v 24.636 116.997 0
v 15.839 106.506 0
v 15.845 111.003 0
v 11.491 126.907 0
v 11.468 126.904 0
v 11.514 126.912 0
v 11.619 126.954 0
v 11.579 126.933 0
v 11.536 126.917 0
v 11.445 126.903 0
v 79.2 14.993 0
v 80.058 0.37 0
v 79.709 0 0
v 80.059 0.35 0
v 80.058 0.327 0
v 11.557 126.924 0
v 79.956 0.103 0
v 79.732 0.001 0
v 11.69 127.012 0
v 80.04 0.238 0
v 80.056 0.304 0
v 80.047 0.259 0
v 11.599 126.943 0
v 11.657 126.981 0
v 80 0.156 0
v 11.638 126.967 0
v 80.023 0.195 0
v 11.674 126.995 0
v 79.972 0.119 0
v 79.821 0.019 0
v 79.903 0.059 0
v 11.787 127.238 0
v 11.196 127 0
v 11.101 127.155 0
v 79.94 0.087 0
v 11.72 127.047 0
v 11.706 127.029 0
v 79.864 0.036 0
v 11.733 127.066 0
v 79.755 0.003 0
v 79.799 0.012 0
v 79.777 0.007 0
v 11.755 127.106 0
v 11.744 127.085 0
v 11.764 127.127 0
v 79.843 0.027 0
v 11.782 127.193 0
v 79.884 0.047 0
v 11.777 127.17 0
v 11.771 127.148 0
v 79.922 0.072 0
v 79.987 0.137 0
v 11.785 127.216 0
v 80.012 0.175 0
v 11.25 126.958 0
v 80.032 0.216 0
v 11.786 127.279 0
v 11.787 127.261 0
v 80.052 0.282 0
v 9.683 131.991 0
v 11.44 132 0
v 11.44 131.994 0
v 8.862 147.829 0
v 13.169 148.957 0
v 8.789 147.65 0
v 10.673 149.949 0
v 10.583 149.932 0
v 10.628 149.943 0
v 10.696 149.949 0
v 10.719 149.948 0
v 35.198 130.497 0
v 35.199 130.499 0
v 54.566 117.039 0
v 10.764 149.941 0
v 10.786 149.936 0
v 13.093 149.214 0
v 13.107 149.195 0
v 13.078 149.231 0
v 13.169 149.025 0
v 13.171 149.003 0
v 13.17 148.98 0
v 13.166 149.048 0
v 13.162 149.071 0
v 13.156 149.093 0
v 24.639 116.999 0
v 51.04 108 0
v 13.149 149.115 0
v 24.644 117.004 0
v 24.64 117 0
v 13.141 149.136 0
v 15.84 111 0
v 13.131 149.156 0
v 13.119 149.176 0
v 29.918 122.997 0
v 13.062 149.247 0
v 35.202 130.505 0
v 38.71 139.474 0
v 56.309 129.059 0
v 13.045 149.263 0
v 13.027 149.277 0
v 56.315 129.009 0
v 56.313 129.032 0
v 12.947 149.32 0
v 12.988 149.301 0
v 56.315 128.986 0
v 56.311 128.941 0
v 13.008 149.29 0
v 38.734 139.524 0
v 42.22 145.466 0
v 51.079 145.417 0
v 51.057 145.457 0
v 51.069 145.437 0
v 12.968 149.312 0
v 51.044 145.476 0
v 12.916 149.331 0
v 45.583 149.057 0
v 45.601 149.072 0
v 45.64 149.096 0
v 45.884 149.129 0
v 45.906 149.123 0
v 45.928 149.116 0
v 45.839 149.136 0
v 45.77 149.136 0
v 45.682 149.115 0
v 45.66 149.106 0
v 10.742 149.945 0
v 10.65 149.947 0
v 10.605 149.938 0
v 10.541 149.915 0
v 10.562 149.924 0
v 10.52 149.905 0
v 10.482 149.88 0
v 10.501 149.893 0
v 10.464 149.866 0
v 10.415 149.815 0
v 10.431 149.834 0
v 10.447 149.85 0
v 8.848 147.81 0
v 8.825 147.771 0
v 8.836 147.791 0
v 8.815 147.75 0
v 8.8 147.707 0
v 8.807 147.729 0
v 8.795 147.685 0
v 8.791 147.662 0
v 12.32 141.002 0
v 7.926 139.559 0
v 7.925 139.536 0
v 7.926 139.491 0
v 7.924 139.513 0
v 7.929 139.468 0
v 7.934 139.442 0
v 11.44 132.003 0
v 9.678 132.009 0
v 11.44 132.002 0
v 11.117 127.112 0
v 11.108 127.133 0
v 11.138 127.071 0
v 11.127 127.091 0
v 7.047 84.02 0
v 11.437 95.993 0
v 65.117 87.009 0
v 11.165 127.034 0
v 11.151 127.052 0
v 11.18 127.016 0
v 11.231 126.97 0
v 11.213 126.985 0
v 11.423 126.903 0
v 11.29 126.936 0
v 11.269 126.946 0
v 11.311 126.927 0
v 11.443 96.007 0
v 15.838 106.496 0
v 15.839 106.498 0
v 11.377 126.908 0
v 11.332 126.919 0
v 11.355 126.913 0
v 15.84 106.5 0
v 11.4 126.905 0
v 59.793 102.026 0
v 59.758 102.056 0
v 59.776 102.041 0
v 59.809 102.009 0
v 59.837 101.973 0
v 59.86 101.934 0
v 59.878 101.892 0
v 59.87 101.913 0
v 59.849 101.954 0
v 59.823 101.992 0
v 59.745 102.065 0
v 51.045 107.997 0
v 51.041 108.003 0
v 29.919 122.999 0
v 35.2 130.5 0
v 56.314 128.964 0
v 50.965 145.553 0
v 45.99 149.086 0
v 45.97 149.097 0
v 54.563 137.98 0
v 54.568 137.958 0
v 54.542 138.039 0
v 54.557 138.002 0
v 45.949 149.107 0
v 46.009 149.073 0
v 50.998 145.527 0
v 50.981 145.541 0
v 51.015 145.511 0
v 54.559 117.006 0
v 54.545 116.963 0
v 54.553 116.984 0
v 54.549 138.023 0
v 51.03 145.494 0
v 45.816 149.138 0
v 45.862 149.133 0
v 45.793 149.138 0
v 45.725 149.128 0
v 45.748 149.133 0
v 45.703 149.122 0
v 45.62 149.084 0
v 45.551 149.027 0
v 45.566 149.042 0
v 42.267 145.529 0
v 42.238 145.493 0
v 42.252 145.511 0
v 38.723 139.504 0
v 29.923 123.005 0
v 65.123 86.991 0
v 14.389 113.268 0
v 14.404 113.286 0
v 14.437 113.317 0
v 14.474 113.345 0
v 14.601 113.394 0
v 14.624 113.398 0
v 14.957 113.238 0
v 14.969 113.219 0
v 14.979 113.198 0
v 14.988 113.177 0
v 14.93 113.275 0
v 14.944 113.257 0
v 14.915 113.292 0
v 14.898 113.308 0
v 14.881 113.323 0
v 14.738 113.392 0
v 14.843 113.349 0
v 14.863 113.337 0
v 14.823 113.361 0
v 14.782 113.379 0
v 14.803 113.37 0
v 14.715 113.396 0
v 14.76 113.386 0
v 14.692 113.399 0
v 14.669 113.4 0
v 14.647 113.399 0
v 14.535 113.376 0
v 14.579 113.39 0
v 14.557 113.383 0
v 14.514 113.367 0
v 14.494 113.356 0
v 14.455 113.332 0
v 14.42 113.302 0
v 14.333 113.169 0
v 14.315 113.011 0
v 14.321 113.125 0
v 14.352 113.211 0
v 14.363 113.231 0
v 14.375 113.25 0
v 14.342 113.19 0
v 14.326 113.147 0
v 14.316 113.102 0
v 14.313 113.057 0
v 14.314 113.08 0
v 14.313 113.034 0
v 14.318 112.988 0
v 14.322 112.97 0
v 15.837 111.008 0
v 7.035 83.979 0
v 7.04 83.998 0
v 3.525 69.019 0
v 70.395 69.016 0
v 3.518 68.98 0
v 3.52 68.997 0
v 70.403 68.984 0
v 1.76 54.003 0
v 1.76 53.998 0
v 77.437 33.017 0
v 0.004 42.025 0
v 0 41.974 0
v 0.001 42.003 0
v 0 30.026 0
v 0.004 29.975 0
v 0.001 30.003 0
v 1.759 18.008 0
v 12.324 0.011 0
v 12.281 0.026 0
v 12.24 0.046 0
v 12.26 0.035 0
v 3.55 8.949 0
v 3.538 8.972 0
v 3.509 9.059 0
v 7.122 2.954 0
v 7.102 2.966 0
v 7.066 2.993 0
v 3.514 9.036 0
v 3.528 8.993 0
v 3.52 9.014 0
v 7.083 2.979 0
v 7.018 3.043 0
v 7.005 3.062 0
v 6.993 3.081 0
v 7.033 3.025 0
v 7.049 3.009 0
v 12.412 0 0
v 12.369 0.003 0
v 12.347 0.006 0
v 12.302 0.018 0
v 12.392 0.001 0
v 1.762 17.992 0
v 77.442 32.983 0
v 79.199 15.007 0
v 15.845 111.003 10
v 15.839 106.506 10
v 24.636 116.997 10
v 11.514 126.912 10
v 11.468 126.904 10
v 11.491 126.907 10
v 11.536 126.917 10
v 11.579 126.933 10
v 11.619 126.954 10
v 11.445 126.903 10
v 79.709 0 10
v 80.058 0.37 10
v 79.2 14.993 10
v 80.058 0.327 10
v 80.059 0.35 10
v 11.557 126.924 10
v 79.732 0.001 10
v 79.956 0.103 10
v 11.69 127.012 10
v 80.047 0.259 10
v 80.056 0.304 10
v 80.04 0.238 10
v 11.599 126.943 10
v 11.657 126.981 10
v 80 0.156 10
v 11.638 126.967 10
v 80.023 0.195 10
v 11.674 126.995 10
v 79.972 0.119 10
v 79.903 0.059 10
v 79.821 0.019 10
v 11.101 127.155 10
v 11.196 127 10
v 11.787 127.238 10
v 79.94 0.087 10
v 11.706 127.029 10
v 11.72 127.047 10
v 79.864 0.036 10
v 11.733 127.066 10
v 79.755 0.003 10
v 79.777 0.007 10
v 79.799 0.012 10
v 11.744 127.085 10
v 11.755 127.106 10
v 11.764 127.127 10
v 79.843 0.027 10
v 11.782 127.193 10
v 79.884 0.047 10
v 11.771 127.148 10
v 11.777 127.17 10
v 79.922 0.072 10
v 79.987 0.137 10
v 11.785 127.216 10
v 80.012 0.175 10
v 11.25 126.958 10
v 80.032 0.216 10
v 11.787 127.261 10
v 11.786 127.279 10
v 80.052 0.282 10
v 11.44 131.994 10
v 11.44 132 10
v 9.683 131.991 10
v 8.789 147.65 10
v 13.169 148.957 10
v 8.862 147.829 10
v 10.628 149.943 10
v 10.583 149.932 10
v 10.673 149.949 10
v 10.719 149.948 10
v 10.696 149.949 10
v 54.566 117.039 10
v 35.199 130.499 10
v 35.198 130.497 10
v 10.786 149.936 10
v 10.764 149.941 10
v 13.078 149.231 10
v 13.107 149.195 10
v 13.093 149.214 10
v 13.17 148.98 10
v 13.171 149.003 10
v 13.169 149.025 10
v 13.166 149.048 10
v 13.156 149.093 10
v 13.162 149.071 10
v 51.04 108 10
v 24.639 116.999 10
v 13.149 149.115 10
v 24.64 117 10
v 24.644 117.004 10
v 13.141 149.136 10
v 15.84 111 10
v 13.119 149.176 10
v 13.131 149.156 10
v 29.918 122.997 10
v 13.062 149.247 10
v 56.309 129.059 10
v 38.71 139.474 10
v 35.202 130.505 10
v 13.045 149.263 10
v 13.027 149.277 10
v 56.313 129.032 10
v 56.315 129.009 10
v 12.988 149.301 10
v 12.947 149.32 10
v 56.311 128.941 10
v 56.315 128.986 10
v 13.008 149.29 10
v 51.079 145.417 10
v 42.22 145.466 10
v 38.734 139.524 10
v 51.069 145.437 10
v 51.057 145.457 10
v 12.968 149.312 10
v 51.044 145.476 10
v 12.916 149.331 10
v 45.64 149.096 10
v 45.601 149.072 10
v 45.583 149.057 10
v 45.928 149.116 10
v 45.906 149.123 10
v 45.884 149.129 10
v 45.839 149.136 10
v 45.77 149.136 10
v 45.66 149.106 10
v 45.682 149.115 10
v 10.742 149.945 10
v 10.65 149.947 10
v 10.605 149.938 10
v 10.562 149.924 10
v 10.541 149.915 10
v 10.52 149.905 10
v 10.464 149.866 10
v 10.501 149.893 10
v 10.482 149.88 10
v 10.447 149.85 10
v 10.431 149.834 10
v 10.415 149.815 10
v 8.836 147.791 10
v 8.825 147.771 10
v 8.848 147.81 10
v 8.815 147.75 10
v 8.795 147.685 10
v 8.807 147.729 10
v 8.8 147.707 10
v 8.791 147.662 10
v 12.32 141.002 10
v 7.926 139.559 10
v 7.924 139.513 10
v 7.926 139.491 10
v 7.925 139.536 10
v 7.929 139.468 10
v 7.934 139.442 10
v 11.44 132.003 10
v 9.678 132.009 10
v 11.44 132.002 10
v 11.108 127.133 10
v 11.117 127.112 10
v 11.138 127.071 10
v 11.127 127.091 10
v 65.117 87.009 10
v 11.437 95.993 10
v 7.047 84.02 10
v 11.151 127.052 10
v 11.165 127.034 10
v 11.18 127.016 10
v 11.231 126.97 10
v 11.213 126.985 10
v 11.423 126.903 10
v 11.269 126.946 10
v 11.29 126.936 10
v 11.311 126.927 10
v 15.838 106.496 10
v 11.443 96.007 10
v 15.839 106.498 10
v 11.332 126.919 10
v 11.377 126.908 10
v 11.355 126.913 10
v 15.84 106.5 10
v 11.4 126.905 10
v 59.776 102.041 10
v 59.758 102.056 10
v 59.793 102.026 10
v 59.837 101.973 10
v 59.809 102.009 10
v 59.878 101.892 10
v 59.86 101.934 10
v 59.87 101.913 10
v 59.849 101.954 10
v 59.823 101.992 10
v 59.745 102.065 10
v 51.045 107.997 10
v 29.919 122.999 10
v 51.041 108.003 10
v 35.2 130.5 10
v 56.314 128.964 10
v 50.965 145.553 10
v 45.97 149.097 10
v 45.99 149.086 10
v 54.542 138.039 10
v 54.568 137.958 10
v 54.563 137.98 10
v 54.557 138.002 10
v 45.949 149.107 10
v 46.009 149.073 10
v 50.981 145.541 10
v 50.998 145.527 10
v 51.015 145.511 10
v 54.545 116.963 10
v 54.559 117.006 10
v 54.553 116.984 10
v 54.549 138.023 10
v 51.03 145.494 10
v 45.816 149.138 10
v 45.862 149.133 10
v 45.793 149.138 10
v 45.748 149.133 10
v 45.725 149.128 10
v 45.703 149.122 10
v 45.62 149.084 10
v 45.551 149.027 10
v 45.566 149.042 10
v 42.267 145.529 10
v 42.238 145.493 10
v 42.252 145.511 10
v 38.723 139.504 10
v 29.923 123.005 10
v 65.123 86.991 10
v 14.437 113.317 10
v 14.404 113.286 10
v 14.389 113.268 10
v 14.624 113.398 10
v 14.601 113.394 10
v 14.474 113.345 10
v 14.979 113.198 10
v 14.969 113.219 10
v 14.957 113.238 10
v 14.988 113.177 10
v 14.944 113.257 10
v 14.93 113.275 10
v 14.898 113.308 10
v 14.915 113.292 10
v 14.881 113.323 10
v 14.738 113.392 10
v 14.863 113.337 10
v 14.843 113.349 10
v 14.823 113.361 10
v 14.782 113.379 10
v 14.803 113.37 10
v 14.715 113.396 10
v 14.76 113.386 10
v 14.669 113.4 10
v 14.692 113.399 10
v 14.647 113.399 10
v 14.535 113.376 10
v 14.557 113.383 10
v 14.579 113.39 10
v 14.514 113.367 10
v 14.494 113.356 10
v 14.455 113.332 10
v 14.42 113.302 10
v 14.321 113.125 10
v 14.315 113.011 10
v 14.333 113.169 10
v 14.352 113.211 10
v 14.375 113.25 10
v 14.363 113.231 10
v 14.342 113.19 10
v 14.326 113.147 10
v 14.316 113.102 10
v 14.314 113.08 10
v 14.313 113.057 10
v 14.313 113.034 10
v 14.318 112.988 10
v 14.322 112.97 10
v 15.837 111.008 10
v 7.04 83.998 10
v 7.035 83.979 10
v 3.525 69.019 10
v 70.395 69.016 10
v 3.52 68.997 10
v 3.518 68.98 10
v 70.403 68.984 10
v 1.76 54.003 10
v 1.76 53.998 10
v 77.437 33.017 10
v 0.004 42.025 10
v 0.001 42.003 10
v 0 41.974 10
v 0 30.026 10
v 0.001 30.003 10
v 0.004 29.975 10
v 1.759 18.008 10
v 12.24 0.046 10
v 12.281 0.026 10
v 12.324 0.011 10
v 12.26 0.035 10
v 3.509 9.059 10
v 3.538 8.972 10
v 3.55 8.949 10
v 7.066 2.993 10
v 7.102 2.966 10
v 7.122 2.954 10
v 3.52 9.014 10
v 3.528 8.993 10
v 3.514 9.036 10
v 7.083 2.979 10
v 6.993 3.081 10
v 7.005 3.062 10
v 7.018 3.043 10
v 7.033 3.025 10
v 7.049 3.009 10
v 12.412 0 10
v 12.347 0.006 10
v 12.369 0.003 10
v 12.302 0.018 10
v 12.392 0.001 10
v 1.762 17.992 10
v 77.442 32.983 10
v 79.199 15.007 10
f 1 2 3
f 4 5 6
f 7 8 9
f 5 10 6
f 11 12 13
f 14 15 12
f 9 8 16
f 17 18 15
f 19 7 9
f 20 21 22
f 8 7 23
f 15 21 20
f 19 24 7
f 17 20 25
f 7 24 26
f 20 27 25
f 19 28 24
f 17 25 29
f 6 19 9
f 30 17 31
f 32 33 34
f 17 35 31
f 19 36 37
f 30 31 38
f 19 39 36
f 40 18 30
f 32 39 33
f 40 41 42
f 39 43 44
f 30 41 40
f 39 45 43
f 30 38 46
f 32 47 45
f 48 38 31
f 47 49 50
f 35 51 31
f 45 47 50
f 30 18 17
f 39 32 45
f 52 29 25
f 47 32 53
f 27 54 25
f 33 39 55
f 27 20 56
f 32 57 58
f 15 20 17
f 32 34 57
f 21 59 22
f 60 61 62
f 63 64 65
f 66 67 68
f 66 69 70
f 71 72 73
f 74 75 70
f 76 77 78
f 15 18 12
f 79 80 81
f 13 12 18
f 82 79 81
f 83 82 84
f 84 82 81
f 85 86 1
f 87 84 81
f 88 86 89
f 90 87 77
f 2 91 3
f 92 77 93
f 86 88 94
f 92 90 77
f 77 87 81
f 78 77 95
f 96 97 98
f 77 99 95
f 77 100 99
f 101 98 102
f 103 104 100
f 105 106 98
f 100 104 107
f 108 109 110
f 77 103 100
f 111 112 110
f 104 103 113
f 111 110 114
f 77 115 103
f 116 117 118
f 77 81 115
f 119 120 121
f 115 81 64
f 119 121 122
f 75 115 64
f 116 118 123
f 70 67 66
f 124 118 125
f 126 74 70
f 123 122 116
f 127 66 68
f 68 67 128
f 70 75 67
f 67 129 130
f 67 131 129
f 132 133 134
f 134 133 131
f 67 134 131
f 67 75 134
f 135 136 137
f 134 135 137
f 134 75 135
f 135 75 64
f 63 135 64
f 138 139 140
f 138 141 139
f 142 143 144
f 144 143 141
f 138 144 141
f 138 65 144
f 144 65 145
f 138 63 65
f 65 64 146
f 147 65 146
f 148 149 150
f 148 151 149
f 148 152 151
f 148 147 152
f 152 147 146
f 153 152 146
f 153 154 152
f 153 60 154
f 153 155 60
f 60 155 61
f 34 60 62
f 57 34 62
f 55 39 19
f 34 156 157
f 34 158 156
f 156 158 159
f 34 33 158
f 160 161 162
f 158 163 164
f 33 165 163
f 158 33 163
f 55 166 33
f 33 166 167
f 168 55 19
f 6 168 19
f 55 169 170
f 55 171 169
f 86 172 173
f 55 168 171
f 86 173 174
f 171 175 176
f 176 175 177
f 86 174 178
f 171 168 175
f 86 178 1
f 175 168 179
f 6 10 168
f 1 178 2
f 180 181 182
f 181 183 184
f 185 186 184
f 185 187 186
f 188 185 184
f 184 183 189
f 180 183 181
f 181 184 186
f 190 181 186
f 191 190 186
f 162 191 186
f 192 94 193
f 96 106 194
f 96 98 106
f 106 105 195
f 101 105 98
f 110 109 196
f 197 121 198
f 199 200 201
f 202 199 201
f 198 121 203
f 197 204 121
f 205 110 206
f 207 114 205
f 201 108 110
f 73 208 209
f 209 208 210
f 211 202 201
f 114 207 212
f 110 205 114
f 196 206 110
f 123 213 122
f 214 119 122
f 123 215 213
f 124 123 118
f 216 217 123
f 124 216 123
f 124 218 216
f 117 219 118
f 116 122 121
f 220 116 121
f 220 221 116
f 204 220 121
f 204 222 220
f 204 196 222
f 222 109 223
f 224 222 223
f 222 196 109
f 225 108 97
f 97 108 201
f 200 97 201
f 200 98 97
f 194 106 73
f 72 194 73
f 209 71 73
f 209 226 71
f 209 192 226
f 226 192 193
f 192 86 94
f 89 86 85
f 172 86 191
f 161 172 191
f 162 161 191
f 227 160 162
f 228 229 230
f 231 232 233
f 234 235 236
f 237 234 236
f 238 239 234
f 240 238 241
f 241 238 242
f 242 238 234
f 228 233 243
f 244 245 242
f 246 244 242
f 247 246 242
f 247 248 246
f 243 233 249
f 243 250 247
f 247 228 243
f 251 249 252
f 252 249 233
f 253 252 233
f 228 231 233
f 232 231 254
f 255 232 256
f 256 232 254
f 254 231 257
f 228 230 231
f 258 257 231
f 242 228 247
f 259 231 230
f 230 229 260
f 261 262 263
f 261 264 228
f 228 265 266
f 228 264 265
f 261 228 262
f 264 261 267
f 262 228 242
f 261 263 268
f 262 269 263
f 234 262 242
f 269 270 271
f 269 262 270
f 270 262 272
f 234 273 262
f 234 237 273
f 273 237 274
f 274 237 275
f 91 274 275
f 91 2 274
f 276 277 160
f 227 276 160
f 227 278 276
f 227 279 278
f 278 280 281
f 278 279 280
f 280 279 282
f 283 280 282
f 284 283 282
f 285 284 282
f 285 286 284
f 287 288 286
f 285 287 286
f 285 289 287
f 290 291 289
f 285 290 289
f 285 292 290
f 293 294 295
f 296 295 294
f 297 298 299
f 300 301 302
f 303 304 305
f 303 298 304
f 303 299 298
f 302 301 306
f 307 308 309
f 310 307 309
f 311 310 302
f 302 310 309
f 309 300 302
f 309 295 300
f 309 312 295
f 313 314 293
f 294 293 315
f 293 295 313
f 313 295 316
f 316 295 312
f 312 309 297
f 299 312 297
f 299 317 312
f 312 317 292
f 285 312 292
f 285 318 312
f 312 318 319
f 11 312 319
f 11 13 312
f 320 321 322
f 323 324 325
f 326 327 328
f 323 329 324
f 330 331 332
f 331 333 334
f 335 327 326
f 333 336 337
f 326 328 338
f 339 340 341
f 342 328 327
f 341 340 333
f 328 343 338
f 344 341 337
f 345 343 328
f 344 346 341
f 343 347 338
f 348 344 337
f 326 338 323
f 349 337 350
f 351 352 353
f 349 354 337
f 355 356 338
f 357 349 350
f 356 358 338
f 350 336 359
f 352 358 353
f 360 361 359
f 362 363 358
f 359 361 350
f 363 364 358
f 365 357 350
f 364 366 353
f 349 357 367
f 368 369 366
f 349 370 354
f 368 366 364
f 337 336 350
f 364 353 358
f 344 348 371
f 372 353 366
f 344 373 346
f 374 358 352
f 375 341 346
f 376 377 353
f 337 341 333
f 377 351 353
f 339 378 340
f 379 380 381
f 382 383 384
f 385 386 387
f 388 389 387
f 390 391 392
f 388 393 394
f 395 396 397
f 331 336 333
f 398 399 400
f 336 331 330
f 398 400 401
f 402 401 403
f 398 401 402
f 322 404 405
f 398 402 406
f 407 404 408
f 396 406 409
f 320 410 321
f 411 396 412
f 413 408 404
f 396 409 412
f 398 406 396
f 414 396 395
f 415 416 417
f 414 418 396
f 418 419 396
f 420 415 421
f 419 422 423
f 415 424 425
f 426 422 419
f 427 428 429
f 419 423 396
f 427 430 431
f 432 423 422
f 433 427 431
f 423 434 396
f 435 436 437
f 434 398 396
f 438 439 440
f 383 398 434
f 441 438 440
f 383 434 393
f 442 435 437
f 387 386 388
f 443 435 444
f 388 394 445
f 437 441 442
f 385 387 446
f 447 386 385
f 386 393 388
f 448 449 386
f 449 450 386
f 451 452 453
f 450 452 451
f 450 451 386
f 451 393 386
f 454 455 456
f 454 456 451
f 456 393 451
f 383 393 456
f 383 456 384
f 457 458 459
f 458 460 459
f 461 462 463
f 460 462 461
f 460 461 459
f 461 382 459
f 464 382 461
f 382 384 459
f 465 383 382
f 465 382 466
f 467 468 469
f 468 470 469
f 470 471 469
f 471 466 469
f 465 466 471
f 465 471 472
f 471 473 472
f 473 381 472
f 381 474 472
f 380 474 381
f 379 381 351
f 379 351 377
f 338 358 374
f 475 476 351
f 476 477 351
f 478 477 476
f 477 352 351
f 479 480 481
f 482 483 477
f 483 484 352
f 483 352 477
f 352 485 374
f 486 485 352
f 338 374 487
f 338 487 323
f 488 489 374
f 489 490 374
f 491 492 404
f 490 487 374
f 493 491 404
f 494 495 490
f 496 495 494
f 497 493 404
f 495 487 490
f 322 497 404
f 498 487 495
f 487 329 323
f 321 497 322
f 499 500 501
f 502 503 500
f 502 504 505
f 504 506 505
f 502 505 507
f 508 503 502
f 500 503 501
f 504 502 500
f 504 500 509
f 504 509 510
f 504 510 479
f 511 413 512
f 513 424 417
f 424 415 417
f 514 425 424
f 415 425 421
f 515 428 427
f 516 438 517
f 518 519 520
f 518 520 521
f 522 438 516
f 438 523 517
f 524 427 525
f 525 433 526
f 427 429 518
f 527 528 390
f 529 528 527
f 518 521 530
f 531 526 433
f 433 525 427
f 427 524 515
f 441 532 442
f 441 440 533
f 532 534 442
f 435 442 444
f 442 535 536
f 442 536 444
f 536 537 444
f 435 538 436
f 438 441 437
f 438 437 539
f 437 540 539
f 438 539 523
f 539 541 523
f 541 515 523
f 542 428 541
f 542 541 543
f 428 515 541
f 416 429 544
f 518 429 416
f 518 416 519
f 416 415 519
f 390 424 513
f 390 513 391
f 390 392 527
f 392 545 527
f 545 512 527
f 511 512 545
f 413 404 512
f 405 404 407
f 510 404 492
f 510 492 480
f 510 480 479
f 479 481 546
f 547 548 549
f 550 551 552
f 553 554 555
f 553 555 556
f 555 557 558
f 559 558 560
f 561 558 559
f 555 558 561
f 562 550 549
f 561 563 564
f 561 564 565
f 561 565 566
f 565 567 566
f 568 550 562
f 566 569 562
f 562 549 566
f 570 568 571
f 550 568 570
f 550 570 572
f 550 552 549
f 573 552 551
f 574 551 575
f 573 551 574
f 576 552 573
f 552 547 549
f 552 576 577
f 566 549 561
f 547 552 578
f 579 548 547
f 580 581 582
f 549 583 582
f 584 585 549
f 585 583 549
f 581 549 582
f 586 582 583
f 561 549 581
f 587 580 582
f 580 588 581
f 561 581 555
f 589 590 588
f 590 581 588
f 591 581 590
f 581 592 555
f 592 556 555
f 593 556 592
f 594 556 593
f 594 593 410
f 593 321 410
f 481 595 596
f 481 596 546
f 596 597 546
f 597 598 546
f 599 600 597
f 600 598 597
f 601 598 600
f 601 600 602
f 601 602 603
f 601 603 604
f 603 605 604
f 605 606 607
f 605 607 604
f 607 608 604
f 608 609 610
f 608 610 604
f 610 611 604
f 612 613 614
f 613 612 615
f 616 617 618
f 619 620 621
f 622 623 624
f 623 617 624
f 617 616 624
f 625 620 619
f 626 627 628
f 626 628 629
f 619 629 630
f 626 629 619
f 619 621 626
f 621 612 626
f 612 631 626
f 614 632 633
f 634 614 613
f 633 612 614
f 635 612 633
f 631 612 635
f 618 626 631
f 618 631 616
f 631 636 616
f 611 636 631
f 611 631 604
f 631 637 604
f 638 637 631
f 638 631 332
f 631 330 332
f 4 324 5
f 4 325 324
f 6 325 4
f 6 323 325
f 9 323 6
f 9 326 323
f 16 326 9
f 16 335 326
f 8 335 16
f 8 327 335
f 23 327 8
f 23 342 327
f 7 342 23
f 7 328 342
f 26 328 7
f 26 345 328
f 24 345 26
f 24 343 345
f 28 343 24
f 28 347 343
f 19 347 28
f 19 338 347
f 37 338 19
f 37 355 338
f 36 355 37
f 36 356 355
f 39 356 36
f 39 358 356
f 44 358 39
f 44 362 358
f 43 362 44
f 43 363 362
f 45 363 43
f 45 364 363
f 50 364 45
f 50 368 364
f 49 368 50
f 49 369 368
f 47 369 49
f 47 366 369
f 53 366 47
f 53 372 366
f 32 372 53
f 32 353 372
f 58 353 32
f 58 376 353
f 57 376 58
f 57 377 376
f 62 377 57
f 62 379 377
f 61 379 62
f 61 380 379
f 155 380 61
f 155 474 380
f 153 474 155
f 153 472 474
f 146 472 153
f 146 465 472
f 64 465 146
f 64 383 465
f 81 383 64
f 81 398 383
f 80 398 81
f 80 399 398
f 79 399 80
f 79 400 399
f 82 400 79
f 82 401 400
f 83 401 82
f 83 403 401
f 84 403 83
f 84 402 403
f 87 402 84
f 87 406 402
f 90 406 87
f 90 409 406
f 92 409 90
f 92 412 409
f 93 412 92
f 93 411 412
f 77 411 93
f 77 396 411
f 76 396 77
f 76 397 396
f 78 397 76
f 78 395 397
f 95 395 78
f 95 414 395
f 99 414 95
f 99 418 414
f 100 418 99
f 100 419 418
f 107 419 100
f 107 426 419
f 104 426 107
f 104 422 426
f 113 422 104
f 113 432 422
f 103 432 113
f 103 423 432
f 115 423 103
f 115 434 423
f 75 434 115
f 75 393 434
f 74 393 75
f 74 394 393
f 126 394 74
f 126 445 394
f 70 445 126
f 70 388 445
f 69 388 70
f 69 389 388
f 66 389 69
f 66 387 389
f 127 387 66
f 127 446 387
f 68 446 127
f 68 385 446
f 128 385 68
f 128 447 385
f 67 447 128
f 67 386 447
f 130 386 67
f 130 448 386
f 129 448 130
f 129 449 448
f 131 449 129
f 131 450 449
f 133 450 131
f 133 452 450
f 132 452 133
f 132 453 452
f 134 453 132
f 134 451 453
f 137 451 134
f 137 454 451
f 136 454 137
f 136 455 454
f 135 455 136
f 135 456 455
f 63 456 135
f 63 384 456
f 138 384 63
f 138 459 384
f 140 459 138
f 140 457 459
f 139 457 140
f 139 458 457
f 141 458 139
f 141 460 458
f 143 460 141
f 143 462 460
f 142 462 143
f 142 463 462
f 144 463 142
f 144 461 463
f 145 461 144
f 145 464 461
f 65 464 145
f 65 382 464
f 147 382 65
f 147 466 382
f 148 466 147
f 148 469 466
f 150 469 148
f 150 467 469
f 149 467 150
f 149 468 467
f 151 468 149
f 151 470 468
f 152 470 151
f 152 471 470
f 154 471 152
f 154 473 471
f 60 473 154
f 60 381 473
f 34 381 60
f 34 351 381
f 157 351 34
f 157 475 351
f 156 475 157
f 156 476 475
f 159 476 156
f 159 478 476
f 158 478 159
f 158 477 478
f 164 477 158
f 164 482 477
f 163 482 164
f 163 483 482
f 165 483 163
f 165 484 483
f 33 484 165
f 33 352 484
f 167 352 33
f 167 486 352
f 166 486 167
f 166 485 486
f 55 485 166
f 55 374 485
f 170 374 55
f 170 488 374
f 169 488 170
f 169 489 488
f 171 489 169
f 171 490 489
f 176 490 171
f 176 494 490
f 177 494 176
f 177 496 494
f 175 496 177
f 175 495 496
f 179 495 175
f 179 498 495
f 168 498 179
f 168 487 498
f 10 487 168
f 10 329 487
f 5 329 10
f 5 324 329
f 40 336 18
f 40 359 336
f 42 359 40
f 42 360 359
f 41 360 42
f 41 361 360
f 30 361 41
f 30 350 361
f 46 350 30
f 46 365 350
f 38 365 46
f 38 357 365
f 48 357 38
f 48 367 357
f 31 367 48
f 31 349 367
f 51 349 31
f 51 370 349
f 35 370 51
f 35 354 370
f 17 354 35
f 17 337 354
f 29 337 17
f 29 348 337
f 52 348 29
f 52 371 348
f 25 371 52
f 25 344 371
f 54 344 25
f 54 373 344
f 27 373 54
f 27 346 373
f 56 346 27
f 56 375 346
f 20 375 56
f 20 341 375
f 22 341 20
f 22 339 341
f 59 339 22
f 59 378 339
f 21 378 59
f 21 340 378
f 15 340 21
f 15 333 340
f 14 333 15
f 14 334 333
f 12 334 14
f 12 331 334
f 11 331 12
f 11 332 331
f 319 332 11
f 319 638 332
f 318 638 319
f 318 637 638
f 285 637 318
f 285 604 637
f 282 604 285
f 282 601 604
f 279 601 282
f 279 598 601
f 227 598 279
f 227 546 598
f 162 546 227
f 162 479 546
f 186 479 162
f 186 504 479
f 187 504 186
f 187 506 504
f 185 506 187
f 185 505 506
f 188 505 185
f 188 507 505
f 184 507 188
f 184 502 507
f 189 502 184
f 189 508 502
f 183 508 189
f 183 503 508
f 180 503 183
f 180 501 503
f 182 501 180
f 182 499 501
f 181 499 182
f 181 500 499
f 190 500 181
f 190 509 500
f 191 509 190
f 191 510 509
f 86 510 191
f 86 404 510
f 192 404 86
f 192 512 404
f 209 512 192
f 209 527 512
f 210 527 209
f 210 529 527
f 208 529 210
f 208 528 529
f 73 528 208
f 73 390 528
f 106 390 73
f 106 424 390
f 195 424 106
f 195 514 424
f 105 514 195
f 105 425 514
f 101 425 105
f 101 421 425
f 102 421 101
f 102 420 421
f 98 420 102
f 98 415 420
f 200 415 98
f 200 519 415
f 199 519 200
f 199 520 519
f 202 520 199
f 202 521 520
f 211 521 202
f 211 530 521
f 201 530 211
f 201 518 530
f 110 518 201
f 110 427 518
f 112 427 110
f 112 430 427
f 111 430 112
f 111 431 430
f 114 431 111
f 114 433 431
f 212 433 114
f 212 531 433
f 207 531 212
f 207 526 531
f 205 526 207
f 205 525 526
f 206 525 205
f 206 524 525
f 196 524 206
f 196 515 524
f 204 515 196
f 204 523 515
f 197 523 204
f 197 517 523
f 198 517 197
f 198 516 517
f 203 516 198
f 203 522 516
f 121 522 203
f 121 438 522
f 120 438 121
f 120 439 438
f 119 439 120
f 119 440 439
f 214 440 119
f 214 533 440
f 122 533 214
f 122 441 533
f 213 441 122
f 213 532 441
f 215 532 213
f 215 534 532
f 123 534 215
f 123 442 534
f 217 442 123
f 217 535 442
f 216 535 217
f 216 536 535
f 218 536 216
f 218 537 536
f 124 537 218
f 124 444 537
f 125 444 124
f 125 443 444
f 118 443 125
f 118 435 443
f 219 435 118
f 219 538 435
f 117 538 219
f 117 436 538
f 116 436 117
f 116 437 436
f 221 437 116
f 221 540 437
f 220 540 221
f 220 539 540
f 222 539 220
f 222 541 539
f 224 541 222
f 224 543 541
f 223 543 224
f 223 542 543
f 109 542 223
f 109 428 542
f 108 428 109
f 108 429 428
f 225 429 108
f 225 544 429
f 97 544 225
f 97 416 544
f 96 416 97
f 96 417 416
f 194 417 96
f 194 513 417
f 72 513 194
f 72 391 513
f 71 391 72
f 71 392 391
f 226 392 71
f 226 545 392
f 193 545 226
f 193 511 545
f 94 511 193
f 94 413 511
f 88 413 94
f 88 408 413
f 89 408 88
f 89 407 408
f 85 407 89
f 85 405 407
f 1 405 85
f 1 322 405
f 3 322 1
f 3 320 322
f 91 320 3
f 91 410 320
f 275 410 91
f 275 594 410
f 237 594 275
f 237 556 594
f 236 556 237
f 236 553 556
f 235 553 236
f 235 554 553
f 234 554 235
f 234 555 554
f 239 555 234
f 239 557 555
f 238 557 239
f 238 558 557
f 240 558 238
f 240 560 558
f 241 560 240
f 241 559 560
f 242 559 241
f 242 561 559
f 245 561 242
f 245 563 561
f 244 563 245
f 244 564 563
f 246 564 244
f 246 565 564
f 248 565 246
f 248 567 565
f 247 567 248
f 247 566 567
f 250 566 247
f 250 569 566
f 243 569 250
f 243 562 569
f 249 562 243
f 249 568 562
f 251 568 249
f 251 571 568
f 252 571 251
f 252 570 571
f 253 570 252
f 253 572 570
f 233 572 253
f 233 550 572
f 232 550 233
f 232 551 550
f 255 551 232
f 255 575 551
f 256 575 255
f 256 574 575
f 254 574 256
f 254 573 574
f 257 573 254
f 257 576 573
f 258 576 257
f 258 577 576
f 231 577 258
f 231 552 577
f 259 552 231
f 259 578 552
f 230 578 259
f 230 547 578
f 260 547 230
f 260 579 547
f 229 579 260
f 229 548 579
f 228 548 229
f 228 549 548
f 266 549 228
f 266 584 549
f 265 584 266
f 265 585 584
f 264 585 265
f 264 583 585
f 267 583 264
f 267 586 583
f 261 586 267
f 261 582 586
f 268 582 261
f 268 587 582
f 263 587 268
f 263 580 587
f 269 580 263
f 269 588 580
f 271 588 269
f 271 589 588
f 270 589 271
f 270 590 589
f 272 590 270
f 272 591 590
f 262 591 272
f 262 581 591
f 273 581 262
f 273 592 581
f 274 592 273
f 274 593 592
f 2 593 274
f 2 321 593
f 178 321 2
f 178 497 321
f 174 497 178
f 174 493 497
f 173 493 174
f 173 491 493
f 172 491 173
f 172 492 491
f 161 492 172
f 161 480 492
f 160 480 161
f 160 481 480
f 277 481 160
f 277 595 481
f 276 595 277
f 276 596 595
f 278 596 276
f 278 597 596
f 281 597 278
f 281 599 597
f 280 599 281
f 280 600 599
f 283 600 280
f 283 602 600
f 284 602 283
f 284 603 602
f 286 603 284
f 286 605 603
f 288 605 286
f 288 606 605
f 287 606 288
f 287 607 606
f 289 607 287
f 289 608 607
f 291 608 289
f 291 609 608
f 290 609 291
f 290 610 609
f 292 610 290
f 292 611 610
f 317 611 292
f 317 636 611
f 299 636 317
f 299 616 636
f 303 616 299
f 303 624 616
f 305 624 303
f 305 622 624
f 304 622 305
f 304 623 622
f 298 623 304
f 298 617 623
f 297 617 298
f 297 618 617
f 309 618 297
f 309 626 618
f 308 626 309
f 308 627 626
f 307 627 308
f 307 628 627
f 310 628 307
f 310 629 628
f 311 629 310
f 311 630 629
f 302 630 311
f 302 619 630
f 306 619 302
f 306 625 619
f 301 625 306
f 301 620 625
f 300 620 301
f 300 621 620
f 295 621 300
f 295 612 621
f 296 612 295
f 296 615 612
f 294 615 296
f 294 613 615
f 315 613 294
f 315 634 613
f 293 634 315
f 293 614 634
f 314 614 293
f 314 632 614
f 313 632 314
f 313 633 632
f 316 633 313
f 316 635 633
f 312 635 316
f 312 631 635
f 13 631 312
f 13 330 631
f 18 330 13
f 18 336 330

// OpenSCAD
// Kat-silhouet naar voorbeeld (reik / zittend, vooraanzicht)
// 150 mm hoogte, 10 mm dikte (extrusie). Zie cat-reaching-reference.png naast dit bestand.
// Eenheden: mm

$fn = 96;

// Totale hoogte (poot / grond → top van opgestoken poot)
H = 150;
// Horizontaal: breedte schaalt mee (beeld ~ hoger dan breed, incl. staart)
W = 88;

// Dikte in extruderichting (Z) — "1 cm" uit je omschrijving
T = 10;

profile_round_r = 0.35;

// Genormaliseerde polygon [0–1]×[0–1] : x links→rechts, y onder→boven. Contour CCW.
cat_pts_norm = [
  // Staart — J-vorm, linksonpen
  [0.00, 0.28],
  [0.02, 0.36],
  [0.04, 0.46],
  [0.08, 0.56],
  [0.13, 0.64],
  [0.18, 0.71],
  // Linker rug / schouder richting opgestoken voorpoot (buitenkant)
  [0.16, 0.76],
  [0.14, 0.82],
  [0.11, 0.88],
  [0.09, 0.93],
  [0.10, 0.985],
  [0.12, 1.00],
  [0.15, 0.995],
  [0.14, 0.94],
  [0.13, 0.88],
  [0.14, 0.80],
  [0.18, 0.74],
  // Nek / achterkop naar oren
  [0.28, 0.78],
  [0.34, 0.82],
  [0.40, 0.87],
  [0.44, 0.93],
  [0.48, 0.97],
  [0.52, 0.995],
  [0.58, 0.97],
  [0.62, 0.92],
  [0.64, 0.86],
  [0.62, 0.78],
  [0.58, 0.72],
  // Rechterzijde borst / nek naar dragend voorbeen
  [0.68, 0.68],
  [0.74, 0.58],
  [0.80, 0.46],
  [0.84, 0.34],
  [0.88, 0.22],
  [0.90, 0.10],
  [0.91, 0.00],
  // Onderkant — zitvlak + rechter voorpoot
  [0.84, 0.00],
  [0.72, 0.00],
  [0.58, 0.00],
  [0.44, 0.00],
  [0.32, 0.00],
  [0.22, 0.00],
  [0.14, 0.00],
  [0.08, 0.02],
  [0.04, 0.06],
  [0.02, 0.12],
  [0.00, 0.20],
];

cat_pts = [ for (p = cat_pts_norm) [ p[0] * W, p[1] * H ] ];

module cat_profile_2d() {
  offset(r = profile_round_r)
    offset(r = -profile_round_r)
      polygon(cat_pts);
}

linear_extrude(T, center = false, convexity = 10)
  cat_profile_2d();
